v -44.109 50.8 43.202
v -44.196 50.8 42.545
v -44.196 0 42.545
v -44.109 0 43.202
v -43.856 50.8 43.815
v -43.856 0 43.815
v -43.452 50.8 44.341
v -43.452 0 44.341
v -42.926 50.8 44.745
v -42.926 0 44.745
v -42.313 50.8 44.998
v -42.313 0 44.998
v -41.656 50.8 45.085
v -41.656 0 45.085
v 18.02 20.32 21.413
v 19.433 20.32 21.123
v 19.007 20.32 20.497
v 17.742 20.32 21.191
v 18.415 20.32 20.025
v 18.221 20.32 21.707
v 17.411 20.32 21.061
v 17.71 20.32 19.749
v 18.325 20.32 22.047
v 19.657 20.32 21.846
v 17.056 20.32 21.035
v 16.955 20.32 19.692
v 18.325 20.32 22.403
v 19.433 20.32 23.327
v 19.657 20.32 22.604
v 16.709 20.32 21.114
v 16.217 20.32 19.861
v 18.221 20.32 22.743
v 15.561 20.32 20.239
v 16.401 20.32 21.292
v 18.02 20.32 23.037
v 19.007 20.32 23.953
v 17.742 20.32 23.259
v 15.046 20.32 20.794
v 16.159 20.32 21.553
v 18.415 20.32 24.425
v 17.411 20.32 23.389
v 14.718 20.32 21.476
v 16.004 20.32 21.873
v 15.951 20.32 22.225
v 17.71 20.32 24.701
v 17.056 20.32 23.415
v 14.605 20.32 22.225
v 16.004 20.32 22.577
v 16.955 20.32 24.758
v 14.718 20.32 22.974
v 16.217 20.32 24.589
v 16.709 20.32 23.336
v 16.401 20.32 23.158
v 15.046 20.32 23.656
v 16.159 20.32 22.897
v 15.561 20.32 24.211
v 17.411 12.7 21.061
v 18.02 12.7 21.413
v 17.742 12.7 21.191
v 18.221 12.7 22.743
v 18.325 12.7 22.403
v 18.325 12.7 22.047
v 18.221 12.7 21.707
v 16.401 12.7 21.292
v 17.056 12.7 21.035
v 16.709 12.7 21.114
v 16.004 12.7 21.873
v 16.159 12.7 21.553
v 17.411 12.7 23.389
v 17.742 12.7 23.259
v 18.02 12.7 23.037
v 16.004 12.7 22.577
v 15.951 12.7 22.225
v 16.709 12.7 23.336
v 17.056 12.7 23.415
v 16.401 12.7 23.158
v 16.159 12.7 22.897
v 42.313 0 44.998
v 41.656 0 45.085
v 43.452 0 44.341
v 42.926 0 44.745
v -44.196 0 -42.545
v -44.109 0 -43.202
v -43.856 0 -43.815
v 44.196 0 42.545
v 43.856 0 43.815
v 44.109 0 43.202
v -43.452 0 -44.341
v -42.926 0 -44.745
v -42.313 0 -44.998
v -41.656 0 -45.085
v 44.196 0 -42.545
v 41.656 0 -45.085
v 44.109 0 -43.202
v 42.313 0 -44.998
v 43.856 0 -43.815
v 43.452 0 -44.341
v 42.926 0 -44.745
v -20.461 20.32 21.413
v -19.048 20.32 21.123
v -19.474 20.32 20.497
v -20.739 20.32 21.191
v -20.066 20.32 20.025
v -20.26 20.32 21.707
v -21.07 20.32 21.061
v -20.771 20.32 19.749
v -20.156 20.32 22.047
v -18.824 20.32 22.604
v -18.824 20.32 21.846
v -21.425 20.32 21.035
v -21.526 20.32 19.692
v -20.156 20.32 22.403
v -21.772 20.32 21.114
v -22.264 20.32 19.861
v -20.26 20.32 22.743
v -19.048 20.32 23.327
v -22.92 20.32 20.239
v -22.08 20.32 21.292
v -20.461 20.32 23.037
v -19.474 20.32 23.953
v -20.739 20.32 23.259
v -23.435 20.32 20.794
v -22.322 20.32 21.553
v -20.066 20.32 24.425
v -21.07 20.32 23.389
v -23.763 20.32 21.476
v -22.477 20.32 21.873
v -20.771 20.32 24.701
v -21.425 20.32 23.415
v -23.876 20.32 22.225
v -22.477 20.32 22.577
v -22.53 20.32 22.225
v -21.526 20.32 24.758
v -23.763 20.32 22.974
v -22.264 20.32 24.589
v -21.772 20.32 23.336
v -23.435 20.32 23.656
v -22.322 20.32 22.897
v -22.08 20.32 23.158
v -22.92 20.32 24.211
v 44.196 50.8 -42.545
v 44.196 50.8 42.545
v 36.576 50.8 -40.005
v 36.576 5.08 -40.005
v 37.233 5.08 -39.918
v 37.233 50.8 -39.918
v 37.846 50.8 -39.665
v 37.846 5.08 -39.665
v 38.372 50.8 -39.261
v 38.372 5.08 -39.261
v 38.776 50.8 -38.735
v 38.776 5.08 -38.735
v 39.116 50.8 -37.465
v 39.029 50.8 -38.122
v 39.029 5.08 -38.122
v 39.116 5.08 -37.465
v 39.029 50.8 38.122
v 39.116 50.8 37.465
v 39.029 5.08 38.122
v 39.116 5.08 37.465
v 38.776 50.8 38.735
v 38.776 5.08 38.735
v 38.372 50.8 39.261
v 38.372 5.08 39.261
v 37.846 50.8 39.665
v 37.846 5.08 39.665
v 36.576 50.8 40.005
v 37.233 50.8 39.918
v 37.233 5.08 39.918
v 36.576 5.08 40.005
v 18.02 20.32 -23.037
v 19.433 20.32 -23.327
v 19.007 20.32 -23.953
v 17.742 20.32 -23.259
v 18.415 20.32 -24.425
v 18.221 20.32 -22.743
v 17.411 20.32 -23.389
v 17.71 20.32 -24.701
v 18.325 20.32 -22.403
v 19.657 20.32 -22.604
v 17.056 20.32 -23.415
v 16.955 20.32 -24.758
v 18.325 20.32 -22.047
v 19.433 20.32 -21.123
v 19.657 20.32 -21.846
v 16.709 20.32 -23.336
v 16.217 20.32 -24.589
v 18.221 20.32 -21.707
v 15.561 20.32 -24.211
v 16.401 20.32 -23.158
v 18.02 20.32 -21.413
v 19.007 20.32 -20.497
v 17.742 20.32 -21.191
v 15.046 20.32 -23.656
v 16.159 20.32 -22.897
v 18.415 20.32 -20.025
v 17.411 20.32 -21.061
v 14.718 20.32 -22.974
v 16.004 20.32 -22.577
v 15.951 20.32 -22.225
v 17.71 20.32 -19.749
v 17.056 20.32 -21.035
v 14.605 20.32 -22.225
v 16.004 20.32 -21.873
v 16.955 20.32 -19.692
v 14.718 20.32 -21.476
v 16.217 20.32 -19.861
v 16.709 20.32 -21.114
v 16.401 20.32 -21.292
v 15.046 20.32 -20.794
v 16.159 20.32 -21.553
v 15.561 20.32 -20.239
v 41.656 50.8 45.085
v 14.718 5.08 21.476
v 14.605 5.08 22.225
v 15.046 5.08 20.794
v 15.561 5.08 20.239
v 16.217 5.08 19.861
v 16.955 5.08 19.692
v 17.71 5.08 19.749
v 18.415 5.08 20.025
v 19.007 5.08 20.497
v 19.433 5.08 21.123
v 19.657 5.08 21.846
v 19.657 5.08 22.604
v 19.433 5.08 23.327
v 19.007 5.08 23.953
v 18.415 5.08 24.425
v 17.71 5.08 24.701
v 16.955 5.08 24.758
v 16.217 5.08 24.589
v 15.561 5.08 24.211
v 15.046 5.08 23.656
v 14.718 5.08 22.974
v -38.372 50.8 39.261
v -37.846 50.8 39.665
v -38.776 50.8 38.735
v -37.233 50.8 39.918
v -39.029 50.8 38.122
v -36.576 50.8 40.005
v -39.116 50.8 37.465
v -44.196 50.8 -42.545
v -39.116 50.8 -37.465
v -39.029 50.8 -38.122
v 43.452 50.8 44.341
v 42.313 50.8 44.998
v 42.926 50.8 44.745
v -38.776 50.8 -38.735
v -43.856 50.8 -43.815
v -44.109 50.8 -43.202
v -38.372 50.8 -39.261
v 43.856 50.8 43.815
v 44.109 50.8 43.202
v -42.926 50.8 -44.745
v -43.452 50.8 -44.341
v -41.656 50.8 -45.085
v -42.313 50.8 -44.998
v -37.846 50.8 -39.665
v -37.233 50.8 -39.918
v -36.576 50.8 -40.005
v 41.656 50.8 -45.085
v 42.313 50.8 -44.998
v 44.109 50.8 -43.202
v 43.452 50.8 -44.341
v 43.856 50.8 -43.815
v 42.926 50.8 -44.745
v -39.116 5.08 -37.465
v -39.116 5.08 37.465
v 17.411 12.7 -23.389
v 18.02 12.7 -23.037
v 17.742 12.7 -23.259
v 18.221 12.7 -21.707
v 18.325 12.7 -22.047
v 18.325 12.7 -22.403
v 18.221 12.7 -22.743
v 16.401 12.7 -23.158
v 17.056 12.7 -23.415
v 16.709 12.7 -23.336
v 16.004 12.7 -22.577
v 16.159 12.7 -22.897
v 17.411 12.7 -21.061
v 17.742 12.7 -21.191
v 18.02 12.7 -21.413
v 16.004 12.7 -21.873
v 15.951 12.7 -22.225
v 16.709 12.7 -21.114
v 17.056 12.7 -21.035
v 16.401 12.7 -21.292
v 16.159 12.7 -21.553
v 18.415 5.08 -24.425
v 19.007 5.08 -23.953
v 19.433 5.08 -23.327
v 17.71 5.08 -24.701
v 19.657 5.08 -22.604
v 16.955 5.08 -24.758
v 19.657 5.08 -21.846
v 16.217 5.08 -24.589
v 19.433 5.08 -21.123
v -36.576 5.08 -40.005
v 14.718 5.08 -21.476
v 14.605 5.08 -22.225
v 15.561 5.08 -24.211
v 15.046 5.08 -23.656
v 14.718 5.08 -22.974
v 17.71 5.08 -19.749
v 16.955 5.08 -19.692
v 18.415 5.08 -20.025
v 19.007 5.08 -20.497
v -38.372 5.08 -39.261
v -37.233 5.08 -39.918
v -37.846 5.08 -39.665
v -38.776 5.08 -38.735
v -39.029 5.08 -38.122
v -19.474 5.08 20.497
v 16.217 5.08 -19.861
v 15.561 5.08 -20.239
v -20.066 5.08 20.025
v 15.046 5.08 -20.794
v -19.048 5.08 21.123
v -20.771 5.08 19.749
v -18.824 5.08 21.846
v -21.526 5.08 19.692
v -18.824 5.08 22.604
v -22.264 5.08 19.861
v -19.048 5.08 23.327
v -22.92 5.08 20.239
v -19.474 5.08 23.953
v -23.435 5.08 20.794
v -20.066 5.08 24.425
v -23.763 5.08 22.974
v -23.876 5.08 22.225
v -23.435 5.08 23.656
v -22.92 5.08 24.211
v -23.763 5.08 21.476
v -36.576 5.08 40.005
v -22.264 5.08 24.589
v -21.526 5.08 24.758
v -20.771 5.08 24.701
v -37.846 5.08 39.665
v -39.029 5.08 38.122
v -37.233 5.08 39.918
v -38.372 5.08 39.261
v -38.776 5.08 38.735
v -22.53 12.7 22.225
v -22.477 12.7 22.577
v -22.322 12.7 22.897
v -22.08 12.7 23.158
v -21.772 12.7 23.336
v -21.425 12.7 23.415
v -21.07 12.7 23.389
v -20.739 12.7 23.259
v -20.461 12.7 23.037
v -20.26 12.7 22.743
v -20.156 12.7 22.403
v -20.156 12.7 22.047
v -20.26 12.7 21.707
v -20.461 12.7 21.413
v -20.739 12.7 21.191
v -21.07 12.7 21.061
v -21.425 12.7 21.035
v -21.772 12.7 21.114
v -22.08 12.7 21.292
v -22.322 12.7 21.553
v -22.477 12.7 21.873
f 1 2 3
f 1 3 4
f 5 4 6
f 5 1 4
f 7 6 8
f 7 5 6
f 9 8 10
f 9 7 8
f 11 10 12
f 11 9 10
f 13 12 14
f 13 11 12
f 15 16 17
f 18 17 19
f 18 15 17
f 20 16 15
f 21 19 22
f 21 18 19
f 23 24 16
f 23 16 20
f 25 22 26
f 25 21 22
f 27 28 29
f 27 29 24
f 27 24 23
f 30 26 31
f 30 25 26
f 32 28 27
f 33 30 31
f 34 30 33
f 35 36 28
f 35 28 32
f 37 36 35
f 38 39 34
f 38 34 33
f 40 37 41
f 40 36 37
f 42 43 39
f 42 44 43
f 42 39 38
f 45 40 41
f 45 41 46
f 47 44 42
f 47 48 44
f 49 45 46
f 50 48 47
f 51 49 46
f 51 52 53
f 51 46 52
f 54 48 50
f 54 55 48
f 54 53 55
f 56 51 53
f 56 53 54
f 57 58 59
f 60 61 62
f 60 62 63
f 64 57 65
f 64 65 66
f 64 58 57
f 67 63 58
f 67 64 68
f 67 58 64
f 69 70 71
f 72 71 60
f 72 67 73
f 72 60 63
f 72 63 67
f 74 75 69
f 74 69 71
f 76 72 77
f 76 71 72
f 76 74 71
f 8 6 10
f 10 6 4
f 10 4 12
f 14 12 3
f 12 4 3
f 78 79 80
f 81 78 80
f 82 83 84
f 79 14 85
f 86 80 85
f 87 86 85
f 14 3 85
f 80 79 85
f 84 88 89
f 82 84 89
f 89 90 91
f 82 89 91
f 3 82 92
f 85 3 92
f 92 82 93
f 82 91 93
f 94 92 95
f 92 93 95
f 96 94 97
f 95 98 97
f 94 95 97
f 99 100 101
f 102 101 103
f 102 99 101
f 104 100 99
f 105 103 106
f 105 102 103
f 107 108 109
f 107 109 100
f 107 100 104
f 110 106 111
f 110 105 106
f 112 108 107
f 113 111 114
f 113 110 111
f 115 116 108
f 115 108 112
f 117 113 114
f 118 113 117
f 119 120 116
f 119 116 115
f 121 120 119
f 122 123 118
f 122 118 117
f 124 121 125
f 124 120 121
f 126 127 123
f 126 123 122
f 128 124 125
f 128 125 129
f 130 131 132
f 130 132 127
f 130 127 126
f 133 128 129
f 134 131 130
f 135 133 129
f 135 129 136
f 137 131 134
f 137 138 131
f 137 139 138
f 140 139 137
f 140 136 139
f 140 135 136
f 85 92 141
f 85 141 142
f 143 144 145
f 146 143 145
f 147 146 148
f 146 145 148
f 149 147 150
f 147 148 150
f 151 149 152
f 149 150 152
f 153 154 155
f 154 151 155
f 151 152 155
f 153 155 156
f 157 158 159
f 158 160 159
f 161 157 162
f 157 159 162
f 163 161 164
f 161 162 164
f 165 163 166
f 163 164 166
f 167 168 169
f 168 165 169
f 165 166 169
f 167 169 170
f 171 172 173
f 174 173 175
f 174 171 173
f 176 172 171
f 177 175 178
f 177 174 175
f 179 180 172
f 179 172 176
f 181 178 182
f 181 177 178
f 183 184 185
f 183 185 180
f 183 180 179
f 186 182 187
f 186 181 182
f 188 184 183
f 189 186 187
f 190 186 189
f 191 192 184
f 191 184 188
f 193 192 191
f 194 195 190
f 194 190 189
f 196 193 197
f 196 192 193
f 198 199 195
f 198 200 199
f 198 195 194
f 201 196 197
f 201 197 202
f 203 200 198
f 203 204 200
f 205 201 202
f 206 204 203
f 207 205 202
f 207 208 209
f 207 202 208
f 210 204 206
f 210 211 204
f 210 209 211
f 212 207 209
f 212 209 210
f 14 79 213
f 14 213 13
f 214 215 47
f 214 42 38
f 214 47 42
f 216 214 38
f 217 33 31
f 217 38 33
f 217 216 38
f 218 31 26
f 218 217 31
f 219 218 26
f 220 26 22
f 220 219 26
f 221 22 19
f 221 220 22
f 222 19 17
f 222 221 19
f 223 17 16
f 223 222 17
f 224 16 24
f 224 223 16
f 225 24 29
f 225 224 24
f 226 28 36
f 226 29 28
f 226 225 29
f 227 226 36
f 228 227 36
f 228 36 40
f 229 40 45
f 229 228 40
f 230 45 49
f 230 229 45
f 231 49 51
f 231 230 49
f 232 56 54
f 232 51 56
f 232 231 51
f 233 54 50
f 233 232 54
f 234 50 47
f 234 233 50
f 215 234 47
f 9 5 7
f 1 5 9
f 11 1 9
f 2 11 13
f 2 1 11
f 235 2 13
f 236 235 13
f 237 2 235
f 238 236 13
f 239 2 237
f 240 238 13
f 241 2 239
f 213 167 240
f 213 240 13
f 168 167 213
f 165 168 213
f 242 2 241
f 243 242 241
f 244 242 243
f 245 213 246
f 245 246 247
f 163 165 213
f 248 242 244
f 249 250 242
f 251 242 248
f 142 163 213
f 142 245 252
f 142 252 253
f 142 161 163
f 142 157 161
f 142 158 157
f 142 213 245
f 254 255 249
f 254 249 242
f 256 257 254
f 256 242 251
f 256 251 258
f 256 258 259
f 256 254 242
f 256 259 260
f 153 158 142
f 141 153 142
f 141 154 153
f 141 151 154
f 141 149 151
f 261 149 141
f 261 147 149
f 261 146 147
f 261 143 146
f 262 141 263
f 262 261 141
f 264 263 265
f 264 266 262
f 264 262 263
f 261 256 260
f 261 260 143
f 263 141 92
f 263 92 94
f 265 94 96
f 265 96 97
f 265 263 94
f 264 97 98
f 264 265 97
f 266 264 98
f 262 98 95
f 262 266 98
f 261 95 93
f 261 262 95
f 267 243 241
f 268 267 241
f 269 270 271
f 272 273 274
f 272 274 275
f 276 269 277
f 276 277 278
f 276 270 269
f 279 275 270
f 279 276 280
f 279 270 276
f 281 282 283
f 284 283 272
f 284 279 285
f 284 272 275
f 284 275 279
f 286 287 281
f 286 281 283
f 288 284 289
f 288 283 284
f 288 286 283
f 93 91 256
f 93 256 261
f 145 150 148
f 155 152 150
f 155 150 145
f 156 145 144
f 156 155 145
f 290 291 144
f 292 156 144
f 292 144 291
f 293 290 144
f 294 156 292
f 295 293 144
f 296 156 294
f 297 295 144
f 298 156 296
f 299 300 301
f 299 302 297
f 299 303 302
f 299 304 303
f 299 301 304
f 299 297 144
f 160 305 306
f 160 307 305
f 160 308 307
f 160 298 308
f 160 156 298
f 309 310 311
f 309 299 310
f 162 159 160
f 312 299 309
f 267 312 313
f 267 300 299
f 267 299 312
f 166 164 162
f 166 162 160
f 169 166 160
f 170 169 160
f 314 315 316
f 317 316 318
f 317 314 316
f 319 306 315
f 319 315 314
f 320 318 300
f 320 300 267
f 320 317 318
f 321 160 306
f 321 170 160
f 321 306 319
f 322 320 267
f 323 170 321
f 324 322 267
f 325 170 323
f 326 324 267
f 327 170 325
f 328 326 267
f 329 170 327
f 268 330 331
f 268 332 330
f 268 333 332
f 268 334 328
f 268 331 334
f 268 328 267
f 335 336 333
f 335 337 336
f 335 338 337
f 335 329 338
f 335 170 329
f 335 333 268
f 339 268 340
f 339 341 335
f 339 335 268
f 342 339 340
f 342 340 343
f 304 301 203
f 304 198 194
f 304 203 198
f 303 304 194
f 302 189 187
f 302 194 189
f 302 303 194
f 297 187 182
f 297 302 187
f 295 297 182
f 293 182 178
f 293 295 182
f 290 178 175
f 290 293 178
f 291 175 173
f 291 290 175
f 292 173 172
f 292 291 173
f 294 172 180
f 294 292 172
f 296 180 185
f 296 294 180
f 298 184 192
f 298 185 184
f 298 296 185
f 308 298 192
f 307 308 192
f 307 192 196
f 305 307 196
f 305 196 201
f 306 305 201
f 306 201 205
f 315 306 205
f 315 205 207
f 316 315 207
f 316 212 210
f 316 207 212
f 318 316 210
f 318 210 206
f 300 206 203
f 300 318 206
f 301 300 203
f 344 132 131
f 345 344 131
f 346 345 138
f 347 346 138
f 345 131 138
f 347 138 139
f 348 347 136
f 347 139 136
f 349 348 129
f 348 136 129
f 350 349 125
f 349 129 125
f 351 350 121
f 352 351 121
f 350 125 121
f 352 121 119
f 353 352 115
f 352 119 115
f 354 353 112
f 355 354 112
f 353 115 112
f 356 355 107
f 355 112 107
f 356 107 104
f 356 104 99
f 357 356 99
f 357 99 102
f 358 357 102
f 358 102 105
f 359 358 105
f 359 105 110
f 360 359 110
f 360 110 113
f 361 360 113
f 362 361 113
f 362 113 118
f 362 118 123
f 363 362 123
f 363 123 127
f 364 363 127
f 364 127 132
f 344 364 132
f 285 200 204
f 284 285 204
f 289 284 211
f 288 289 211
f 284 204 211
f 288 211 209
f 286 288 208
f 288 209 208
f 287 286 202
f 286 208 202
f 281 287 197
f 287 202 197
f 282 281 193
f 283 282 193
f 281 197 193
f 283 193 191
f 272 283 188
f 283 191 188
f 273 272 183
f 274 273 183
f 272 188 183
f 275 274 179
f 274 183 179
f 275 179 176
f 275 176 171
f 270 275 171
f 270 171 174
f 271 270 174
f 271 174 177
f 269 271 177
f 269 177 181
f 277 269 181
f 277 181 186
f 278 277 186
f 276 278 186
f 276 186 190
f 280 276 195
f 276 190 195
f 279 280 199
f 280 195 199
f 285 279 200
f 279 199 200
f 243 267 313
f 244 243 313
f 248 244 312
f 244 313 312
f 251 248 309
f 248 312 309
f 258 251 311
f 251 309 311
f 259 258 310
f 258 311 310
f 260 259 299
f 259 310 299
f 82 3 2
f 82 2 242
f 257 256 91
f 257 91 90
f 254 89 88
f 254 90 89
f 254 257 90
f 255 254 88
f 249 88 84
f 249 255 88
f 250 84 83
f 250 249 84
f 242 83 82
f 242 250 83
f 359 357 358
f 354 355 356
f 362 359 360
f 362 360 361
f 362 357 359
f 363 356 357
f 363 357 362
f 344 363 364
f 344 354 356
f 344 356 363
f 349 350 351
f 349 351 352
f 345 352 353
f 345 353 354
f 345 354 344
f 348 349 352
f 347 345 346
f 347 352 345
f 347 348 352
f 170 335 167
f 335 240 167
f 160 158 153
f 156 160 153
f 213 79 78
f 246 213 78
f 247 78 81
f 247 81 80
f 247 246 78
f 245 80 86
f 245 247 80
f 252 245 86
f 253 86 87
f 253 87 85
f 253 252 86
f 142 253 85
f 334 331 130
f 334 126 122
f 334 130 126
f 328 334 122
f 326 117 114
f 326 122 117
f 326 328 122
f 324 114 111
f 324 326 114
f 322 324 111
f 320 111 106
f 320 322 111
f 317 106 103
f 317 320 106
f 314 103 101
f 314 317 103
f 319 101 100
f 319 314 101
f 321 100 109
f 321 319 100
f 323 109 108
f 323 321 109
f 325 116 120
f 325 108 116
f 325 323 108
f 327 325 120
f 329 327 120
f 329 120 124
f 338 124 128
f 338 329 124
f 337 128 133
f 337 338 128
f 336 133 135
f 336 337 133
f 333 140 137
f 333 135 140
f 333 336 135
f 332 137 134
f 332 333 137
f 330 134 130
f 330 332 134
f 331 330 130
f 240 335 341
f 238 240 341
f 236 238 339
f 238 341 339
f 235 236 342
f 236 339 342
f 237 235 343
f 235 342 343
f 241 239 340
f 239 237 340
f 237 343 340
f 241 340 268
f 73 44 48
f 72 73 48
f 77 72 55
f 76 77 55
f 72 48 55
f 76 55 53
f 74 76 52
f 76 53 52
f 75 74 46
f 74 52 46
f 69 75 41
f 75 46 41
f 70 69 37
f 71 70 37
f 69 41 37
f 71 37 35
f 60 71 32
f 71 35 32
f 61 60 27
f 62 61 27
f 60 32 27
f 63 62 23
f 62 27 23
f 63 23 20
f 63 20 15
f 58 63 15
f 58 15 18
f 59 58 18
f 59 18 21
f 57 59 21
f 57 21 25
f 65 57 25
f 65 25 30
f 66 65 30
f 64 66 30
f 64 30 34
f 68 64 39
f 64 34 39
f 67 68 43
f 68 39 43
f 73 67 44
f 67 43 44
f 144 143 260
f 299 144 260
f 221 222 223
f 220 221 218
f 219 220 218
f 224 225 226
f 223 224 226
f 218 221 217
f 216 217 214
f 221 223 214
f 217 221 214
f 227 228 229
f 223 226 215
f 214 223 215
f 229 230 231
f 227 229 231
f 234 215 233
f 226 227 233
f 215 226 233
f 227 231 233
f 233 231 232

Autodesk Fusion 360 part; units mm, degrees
sketch "Sketch1" plane through (0, 0, 0) normal (0, 1, 0) x (1, 0, 0) in component "Case"
  line L0 (44.196, -45.085) -> (-44.196, -45.085)
  line L1 (-44.196, -45.085) -> (-44.196, 45.085)
  line L2 (-44.196, 45.085) -> (44.196, 45.085)
  line L3 (44.196, 45.085) -> (44.196, -45.085)
  line L4 (44.196, -45.085) -> (-44.196, 45.085) construction
  line L5 (-44.196, -45.085) -> (44.196, 45.085) construction
  dimension "d1" = 90.17
  dimension "d2" = 88.392
extrude "Extrude1" add sketch "Sketch1" along normal blind 50.8 makes body 1 in component "Case"
sketch "Sketch2" plane through (0, 50.8, 0) normal (0, 1, 0) x (-1, 0, 0) in component "Case"
  line L0 (-44.196, -45.085) -> (44.196, -45.085)
  line L1 (44.196, -45.085) -> (44.196, 45.085)
  line L2 (44.196, 45.085) -> (-44.196, 45.085)
  line L3 (-44.196, 45.085) -> (-44.196, -45.085)
sketch "Sketch3" plane through (0, 50.8, 0) normal (0, 1, 0) x (-1, 0, 0) in component "Case"
  line L0 (39.116, 40.005) -> (-39.116, 40.005)
  line L1 (-39.116, 40.005) -> (-39.116, -40.005)
  line L2 (-39.116, -40.005) -> (39.116, -40.005)
  line L3 (39.116, -40.005) -> (39.116, 40.005)
  line L4 (39.116, 40.005) -> (-39.116, -40.005) construction
  line L5 (-39.116, 40.005) -> (39.116, -40.005) construction
  dimension "d5" = 78.232
  dimension "d6" = 80.01
extrude "Extrude2" cut sketch "Sketch3" against normal blind 45.72 bodies 1 in component "Case"
fillet "Fillet1" radius 2.54 8 edges at (44.196, 25.4, 45.085) (-44.196, 25.4, 45.085) (39.116, 27.94, -40.005) (-39.116, 27.94, -40.005) (-44.196, 25.4, -45.085) (39.116, 27.94, 40.005) (-39.116, 27.94, 40.005) (44.196, 25.4, -45.085) on bodies 1 in component "Case"
sketch "Sketch5" plane through (0, 5.08, 0) normal (0, 1, 0) x (-1, 0, 0) in component "Case"
  circle A0 centre (-17.145, -22.225) radius 2.54
  circle A1 centre (-17.145, 22.225) radius 2.54
  circle A2 centre (21.336, 22.225) radius 2.54
  arc A3 (39.116, 37.465) -> (36.576, 40.005) centre (36.576, 37.465) ccw
  line L0 (36.576, 40.005) -> (-36.576, 40.005)
  arc A4 (-36.576, 40.005) -> (-39.116, 37.465) centre (-36.576, 37.465) ccw
  line L1 (-39.116, 37.465) -> (-39.116, -37.465)
  arc A5 (-39.116, -37.465) -> (-36.576, -40.005) centre (-36.576, -37.465) ccw
  line L2 (-36.576, -40.005) -> (36.576, -40.005)
  arc A6 (36.576, -40.005) -> (39.116, -37.465) centre (36.576, -37.465) ccw
  line L3 (39.116, -37.465) -> (39.116, 37.465)
  dimension "d19" = 5.08
  dimension "d20" = 5.08
  dimension "d21" = 5.08
  dimension "d22" = 17.145
  dimension "d23" = 17.145
  dimension "d24" = 21.336
  dimension "d25" = 22.225
  dimension "d26" = 22.225
  dimension "d27" = 22.225
sketch "Sketch6" plane through (0, 5.08, 0) normal (0, 1, 0) x (-1, 0, 0) in component "Case"
  circle A0 centre (-17.145, 22.225) radius 2.54
  arc A1 (39.116, 37.465) -> (36.576, 40.005) centre (36.576, 37.465) ccw
  line L0 (36.576, 40.005) -> (-36.576, 40.005)
  arc A2 (-36.576, 40.005) -> (-39.116, 37.465) centre (-36.576, 37.465) ccw
  line L1 (-39.116, 37.465) -> (-39.116, -37.465)
  arc A3 (-39.116, -37.465) -> (-36.576, -40.005) centre (-36.576, -37.465) ccw
  line L2 (-36.576, -40.005) -> (36.576, -40.005)
  arc A4 (36.576, -40.005) -> (39.116, -37.465) centre (36.576, -37.465) ccw
  line L3 (39.116, -37.465) -> (39.116, 37.465)
  dimension "d30" = 5.08
  dimension "d31" = 17.145
  dimension "d32" = 22.225
extrude "Extrude4" add sketch "Sketch6" along normal blind 15.24 separate body contours A0 makes body 2 in component "Case"
sketch "Sketch7" plane through (0, 5.08, 0) normal (0, 1, 0) x (-1, 0, 0) in component "Case"
  arc A0 (39.116, 37.465) -> (36.576, 40.005) centre (36.576, 37.465) ccw
  line L0 (36.576, 40.005) -> (-36.576, 40.005)
  arc A1 (-36.576, 40.005) -> (-39.116, 37.465) centre (-36.576, 37.465) ccw
  line L1 (-39.116, 37.465) -> (-39.116, -37.465)
  arc A2 (-39.116, -37.465) -> (-36.576, -40.005) centre (-36.576, -37.465) ccw
  line L2 (-36.576, -40.005) -> (36.576, -40.005)
  arc A3 (36.576, -40.005) -> (39.116, -37.465) centre (36.576, -37.465) ccw
  line L3 (39.116, -37.465) -> (39.116, 37.465)
  circle A4 centre (21.336, 22.225) radius 2.54
  dimension "d35" = 5.08
  dimension "d36" = 21.336
  dimension "d37" = 22.225
extrude "Extrude5" add sketch "Sketch7" along normal blind 15.24 contours A4 bodies 1 in component "Case"
sketch "Sketch8" plane through (0, 5.08, 0) normal (0, 1, 0) x (-1, 0, 0) in component "Case"
  circle A0 centre (21.336, 22.225) radius 2.54
  arc A1 (39.116, 37.465) -> (36.576, 40.005) centre (36.576, 37.465) ccw
  line L0 (36.576, 40.005) -> (-36.576, 40.005)
  arc A2 (-36.576, 40.005) -> (-39.116, 37.465) centre (-36.576, 37.465) ccw
  line L1 (-39.116, 37.465) -> (-39.116, -37.465)
  arc A3 (-39.116, -37.465) -> (-36.576, -40.005) centre (-36.576, -37.465) ccw
  line L2 (-36.576, -40.005) -> (36.576, -40.005)
  arc A4 (36.576, -40.005) -> (39.116, -37.465) centre (36.576, -37.465) ccw
  line L3 (39.116, -37.465) -> (39.116, 37.465)
  circle A5 centre (-17.145, -22.225) radius 2.54
  dimension "d40" = 5.08
  dimension "d41" = 22.225
  dimension "d42" = 17.145
extrude "Extrude6" add sketch "Sketch8" along normal blind 15.24 contours A5 bodies 1 in component "Case"
sketch "Sketch9" plane through (0, 20.32, 0) normal (0, 1, 0) x (-1, 0, 0) in component "Case"
  circle A0 centre (-17.145, 22.225) radius 2.54
  circle A1 centre (-17.145, 22.225) radius 1.1938
  dimension "d45" = 2.3876
extrude "Extrude7" cut sketch "Sketch9" against normal blind 7.62 contours A1 bodies 2 in component "Case"
sketch "Sketch10" plane through (0, 20.32, 0) normal (0, 1, 0) x (-1, 0, 0) in component "Case"
  circle A0 centre (21.336, 22.225) radius 2.54
  circle A1 centre (21.336, 22.225) radius 1.1938
  dimension "d48" = 2.3876
extrude "Extrude8" cut sketch "Sketch10" against normal blind 7.62 contours A1 bodies 1 in component "Case"
sketch "Sketch11" plane through (0, 20.32, 0) normal (0, 1, 0) x (-1, 0, 0) in component "Case"
  circle A0 centre (-17.145, -22.225) radius 2.54
  circle A1 centre (-17.145, -22.225) radius 1.1938
  dimension "d51" = 2.3876
extrude "Extrude9" cut sketch "Sketch11" against normal blind 7.62 contours A1 bodies 1 in component "Case"
component "Case" placed x (1, 0, 0) y (0, 1, 0) z (0, 0, 1) at (0, 0, 0)
